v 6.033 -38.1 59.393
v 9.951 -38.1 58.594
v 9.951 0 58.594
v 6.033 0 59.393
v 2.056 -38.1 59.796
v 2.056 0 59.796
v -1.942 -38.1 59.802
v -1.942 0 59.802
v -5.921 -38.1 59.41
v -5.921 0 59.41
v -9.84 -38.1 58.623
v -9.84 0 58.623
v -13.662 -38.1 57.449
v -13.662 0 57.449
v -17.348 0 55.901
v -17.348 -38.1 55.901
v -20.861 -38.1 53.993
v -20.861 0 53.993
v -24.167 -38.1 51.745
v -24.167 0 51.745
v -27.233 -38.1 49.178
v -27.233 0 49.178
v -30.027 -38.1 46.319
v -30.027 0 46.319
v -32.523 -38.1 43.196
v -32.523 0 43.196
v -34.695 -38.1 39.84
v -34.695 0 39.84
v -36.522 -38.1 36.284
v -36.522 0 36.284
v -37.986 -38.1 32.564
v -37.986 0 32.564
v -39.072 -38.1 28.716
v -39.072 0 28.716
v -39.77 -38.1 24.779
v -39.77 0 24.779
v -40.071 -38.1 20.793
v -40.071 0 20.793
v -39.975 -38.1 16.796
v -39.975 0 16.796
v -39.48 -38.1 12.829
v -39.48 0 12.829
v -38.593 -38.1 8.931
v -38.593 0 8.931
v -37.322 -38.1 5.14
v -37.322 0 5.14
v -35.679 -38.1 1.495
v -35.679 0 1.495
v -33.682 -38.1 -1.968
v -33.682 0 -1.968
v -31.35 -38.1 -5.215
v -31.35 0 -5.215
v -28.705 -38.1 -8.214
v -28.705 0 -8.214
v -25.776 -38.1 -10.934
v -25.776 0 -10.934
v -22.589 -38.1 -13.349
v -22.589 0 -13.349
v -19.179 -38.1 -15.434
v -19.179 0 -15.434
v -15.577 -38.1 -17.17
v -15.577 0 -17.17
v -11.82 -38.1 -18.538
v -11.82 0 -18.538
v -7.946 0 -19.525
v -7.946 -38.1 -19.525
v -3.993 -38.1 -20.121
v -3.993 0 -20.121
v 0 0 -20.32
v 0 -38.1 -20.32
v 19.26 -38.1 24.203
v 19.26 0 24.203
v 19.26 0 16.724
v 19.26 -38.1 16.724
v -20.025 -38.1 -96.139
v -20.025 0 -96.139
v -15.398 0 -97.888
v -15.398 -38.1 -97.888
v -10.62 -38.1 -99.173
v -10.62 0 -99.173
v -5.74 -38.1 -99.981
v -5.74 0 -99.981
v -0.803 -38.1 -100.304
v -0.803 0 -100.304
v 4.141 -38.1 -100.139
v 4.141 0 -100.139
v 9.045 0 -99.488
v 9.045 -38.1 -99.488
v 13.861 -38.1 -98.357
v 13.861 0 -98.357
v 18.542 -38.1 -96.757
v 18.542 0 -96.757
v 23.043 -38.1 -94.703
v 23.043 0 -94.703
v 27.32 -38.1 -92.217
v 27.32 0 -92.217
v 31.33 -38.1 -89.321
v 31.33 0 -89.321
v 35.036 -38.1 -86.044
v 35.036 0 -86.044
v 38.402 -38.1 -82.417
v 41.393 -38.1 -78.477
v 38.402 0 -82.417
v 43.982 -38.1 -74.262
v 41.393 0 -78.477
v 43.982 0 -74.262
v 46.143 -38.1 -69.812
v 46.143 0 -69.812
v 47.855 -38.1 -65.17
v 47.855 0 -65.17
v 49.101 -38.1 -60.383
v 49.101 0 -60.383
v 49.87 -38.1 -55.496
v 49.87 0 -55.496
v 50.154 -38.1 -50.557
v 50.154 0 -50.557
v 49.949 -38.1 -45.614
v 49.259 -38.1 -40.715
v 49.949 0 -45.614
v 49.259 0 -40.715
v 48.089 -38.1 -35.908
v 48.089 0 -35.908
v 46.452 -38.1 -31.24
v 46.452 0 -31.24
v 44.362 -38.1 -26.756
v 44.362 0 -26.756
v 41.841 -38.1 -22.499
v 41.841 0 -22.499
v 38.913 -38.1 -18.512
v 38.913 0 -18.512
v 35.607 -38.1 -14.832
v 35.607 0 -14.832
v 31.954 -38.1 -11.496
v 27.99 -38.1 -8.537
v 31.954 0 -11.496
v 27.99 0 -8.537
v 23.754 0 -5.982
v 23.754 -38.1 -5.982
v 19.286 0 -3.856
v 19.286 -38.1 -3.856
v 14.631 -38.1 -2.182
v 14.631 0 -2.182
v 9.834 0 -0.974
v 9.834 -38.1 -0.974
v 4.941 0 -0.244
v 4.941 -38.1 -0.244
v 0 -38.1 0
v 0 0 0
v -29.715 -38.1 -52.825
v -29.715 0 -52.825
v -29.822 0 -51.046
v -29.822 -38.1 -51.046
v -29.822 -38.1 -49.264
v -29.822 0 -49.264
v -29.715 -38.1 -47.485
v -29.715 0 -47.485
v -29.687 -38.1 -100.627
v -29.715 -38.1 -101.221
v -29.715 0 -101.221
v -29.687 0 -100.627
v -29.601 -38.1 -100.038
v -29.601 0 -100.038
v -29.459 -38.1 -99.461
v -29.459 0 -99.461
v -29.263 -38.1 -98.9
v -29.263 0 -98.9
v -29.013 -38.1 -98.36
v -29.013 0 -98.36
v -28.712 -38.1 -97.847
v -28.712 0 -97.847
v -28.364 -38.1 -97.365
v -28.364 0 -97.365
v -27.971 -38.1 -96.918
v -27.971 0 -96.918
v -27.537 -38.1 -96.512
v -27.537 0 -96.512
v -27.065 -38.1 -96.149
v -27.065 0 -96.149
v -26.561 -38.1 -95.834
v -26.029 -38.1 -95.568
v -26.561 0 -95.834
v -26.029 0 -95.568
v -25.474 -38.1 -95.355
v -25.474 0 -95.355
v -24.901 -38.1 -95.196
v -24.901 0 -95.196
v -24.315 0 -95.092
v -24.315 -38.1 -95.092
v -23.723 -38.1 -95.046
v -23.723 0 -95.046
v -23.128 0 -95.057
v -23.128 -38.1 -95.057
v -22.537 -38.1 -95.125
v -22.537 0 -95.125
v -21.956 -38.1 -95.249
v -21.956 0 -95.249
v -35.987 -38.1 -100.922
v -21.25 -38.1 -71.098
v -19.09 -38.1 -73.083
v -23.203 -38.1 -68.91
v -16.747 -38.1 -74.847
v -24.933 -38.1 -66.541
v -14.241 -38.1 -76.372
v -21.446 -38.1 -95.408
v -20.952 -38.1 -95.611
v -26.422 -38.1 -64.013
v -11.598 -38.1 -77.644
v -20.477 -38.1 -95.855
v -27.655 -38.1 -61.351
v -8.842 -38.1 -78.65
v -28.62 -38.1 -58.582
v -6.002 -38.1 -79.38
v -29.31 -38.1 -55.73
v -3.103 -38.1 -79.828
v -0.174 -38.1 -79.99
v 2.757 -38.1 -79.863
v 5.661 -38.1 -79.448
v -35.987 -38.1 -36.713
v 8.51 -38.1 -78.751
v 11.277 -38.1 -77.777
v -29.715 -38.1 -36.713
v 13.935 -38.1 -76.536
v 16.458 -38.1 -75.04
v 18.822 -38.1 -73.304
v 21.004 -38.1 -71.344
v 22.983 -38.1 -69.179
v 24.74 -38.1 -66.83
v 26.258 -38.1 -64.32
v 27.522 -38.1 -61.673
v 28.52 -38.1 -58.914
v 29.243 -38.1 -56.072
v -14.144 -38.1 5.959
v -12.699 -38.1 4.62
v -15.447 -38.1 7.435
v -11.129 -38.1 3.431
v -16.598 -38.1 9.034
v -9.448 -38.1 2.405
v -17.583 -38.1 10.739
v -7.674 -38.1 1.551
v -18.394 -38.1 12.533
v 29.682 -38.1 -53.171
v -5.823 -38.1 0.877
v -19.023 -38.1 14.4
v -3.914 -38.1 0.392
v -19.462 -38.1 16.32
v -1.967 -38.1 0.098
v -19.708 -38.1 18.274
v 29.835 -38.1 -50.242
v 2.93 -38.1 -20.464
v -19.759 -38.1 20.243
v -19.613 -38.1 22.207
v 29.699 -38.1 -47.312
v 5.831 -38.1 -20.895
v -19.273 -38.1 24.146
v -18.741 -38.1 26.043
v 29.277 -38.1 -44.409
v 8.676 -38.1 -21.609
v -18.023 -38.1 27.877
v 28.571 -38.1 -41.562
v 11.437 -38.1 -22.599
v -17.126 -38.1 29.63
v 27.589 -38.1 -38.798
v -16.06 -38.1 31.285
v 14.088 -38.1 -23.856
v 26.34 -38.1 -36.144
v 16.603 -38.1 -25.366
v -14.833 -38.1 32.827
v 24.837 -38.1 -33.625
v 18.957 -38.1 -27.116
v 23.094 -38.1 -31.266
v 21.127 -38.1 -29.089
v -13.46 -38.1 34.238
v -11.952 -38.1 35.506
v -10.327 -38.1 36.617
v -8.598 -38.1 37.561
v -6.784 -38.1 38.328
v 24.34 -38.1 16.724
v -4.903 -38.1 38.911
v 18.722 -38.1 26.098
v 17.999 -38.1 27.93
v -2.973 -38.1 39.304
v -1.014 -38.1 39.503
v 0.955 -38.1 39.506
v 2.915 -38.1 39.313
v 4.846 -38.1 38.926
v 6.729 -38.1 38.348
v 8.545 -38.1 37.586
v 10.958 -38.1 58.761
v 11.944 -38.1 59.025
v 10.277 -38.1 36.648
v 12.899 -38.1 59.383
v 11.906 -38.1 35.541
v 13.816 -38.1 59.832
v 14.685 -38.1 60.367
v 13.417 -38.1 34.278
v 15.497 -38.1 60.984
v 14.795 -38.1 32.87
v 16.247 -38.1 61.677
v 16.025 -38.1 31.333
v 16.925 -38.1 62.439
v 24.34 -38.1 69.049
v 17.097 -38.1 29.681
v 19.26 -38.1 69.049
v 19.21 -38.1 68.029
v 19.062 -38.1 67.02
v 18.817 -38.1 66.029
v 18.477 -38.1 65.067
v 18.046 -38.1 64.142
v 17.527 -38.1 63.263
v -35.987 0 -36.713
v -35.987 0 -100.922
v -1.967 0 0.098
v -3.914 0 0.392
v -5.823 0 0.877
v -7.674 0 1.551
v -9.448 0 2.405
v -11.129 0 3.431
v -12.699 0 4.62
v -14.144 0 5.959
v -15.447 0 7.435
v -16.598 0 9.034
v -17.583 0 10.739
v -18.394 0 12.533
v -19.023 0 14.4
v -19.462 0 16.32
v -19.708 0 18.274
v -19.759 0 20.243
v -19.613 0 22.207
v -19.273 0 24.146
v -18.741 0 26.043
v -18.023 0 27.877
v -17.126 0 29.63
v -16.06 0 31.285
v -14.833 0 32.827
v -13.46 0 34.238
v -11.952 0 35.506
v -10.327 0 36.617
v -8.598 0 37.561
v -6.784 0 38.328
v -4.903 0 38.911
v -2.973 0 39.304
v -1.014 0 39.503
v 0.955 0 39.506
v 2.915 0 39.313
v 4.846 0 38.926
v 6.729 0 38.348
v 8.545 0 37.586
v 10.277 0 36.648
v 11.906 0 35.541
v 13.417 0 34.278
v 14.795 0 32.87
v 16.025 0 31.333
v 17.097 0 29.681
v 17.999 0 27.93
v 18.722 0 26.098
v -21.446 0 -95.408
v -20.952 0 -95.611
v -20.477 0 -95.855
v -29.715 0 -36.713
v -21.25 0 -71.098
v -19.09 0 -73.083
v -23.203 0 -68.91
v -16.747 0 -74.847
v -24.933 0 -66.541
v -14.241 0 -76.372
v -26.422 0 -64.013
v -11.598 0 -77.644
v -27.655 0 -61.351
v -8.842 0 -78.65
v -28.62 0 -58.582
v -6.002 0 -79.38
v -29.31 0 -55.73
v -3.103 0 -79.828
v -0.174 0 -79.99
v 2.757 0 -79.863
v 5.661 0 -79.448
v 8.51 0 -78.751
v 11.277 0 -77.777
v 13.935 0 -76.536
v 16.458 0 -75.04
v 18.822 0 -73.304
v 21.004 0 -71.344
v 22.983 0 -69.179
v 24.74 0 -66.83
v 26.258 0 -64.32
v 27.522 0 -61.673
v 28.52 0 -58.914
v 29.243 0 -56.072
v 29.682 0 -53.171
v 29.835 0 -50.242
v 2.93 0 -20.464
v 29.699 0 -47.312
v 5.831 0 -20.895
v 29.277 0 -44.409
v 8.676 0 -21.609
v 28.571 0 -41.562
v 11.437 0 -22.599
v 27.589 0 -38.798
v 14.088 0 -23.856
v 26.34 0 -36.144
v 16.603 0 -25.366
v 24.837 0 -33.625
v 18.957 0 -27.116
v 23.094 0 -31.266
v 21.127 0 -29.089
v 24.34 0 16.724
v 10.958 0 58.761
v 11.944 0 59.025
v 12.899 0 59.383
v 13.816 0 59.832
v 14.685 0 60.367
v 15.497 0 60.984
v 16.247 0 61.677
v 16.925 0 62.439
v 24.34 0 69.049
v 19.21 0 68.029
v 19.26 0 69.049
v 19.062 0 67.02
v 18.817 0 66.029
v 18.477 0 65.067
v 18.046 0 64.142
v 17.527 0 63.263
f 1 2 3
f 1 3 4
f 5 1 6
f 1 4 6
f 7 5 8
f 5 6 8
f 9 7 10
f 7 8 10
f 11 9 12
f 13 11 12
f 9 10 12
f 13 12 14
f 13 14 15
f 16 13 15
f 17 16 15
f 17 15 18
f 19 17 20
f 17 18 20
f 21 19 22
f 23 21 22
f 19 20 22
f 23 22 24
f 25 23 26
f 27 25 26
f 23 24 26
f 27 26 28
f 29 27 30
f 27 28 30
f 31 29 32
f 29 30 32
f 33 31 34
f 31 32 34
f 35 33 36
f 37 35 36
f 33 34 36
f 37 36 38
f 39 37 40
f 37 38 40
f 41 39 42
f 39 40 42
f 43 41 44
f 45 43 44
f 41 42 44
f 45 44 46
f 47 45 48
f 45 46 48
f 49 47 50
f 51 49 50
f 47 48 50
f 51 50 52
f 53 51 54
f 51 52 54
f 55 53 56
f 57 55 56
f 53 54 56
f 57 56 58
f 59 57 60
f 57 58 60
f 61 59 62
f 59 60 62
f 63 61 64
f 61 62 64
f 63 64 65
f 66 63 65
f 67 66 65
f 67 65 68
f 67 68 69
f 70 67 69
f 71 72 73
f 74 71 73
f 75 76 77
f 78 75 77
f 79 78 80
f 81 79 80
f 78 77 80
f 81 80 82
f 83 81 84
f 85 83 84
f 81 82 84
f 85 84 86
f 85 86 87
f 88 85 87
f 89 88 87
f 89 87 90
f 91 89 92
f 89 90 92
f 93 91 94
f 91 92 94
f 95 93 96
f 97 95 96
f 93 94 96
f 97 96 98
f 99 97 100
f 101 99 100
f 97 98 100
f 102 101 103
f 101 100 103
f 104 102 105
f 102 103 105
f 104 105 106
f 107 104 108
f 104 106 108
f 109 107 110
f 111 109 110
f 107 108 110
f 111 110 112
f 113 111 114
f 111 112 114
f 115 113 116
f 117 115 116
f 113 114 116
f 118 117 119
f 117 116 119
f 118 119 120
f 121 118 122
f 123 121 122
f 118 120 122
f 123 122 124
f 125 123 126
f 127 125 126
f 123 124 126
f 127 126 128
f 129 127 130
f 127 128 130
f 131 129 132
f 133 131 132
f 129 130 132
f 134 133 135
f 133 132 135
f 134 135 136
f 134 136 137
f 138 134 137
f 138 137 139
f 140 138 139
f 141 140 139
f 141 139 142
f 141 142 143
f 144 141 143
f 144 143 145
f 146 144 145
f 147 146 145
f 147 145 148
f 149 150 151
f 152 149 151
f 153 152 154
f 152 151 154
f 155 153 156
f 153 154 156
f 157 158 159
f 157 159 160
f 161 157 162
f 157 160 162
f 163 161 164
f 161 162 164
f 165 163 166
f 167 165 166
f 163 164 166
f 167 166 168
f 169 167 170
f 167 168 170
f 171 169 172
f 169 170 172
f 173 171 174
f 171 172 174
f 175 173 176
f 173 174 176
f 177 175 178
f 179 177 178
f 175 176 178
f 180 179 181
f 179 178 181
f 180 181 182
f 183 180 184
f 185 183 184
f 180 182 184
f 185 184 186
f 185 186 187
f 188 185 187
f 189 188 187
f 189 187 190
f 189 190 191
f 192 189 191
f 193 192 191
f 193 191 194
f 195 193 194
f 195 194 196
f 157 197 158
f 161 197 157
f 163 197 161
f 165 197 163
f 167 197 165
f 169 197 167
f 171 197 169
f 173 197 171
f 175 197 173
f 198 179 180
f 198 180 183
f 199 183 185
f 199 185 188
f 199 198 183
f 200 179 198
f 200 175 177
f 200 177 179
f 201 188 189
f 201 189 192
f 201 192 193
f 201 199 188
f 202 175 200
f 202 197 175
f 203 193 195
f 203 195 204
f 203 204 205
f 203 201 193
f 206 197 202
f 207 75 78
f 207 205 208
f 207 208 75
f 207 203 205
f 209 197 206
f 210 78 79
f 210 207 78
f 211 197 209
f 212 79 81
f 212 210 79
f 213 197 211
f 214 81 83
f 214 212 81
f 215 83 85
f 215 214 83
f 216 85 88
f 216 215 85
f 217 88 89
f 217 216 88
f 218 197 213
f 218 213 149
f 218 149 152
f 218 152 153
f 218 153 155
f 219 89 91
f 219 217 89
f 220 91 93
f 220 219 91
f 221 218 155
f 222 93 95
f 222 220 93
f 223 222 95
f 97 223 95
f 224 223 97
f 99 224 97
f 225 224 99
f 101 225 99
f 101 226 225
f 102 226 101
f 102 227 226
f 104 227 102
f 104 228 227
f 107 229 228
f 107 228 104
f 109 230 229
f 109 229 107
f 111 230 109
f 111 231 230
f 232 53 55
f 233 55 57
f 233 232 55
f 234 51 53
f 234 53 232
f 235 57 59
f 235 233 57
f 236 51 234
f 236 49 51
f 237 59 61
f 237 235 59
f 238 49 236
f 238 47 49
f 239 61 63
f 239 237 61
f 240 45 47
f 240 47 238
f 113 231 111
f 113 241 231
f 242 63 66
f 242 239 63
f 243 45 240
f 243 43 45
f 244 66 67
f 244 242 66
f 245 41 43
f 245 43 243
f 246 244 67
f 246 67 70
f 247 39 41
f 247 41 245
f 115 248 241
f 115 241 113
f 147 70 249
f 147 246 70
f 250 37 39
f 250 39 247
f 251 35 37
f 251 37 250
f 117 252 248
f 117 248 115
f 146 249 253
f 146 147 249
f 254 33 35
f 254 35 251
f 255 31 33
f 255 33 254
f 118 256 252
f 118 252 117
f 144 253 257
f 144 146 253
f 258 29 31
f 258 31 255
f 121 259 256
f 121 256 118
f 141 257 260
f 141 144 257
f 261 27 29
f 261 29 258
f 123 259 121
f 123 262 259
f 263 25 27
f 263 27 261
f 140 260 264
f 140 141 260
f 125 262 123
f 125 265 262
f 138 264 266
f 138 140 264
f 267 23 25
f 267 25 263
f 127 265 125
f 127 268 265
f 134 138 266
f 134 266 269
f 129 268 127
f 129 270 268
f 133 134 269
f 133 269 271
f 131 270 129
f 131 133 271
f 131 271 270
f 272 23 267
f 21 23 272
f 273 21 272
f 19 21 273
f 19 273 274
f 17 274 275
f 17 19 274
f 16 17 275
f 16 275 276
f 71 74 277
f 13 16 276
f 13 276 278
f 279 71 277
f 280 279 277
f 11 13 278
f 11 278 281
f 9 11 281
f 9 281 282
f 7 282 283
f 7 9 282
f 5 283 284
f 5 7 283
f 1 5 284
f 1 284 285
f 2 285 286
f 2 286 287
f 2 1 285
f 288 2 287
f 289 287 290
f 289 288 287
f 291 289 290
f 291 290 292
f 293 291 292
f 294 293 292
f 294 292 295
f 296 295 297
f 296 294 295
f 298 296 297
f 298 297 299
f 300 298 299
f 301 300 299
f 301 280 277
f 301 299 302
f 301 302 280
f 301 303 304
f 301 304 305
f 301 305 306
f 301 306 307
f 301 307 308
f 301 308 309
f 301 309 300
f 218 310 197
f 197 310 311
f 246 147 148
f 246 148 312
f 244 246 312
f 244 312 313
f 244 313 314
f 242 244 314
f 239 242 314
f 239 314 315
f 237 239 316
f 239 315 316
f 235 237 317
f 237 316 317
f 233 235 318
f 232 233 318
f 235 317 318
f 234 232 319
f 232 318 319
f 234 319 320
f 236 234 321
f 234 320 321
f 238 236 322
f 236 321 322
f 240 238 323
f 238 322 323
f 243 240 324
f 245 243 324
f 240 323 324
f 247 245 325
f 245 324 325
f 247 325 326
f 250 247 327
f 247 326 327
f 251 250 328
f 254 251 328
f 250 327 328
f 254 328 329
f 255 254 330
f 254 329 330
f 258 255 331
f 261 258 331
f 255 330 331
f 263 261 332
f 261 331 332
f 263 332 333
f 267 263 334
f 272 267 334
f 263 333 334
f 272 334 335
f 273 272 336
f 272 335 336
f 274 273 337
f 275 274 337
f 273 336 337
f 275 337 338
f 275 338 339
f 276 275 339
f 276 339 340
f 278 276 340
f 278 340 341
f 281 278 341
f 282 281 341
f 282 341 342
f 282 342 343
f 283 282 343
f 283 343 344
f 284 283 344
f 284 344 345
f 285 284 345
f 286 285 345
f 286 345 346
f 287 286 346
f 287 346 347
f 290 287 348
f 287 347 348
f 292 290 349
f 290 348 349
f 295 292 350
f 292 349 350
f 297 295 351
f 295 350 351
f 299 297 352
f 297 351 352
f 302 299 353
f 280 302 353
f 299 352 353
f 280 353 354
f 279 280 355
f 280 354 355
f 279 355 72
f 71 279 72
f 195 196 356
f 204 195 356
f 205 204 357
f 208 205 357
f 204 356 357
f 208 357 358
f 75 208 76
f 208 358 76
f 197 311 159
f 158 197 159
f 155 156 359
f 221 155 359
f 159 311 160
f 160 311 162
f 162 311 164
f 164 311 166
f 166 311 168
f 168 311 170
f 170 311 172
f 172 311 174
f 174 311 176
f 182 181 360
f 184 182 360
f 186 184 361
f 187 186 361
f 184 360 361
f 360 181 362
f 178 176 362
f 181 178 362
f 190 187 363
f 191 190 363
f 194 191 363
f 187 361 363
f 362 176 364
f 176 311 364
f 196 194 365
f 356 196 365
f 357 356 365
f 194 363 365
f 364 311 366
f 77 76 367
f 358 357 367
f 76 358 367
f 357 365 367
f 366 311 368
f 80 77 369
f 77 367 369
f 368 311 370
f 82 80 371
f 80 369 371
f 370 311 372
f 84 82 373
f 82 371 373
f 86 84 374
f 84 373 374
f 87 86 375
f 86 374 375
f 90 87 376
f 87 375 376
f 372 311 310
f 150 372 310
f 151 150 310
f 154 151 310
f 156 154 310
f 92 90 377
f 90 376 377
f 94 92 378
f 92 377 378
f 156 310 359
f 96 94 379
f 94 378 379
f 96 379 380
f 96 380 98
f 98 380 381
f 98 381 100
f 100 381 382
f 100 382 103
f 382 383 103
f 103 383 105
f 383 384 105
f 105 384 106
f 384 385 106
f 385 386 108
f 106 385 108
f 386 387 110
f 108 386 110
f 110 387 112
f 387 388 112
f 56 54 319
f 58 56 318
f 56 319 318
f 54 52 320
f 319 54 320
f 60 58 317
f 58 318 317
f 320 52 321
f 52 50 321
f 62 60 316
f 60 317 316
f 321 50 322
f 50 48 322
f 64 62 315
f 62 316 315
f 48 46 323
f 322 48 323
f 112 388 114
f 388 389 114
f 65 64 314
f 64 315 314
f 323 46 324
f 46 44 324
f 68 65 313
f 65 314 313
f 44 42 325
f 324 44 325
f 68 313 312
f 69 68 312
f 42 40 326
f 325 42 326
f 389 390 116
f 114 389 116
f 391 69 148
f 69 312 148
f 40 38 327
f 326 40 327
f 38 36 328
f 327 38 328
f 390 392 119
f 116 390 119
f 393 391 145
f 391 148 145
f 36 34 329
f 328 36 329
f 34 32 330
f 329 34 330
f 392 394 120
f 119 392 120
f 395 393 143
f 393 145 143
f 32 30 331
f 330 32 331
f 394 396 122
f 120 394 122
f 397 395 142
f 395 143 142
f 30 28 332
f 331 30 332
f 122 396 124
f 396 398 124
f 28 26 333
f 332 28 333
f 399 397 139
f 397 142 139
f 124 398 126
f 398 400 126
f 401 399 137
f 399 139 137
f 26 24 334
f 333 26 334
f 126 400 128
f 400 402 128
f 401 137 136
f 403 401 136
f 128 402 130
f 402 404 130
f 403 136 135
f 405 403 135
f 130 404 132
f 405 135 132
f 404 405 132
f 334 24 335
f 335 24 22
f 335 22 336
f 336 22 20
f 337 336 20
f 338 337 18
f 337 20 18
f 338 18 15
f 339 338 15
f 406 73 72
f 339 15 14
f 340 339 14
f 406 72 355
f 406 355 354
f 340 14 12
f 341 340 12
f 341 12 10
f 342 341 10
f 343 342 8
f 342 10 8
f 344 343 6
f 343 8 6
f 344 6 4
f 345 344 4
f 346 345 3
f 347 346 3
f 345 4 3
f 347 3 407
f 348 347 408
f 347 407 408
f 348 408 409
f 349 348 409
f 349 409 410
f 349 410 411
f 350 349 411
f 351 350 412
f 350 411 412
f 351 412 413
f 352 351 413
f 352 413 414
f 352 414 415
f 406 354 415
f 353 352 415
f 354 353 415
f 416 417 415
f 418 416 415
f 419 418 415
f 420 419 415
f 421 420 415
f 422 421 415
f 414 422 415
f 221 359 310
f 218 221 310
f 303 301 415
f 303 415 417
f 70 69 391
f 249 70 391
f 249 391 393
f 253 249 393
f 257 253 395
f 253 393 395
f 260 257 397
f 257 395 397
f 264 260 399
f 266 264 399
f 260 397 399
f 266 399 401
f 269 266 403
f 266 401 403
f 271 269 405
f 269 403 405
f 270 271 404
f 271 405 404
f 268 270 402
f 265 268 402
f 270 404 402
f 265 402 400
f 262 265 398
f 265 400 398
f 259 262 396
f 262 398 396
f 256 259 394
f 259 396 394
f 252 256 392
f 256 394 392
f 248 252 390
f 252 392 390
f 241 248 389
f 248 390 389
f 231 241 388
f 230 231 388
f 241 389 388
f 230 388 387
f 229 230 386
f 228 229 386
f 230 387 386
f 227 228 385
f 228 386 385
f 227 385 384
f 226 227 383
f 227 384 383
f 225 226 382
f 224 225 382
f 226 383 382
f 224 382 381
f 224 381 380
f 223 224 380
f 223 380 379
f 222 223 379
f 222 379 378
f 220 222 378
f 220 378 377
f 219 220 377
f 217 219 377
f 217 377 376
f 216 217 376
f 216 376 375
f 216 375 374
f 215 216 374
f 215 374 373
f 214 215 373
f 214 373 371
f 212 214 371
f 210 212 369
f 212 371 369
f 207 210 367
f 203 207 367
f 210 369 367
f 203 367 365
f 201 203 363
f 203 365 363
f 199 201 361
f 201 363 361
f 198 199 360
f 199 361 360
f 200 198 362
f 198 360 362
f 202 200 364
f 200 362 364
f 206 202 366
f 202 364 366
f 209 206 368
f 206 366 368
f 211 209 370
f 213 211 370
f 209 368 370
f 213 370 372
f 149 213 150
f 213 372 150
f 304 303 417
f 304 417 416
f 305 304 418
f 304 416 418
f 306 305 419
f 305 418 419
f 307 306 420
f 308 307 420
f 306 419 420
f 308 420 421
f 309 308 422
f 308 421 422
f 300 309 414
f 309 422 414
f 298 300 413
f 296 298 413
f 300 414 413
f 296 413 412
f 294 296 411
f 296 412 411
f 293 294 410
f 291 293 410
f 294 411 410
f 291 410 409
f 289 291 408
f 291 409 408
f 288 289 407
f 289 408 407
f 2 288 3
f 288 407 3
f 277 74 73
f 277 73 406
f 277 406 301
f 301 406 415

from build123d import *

# Parameters (mm, degrees)
F1_DEPTH = 38.1


with BuildPart() as f1:
    # F0 (on Front) → F1 (new body)
    with BuildSketch(Plane.XZ):
        with BuildLine():
            ThreePointArc((-20.02527, -96.13909), (49.101263, -60.382661), (0, 0))
            ThreePointArc((0, 0), (-15.465639, 32.071315), (19.259737, 24.20344))
            Line((19.259737, 24.20344), (19.259737, 54.919144))
            ThreePointArc((19.259737, 54.919144), (14.720483, 57.04847), (9.950919, 58.594471))
            ThreePointArc((9.950919, 58.594471), (-39.769695, 24.779488), (0, -20.32))
            ThreePointArc((0, -20.32), (22.020464, -70.285545), (-29.715391, -52.825367))
            Line((-29.715391, -52.825367), (-29.715391, -90.559729))
            ThreePointArc((-29.715391, -90.559729), (-25.941689, -93.080237), (-21.955613, -95.249332))
            ThreePointArc((-21.955613, -95.249332), (-20.951886, -95.610565), (-20.02527, -96.13909))
        make_face()
        Polygon((19.259737, 54.919144), (19.259737, 24.20344), (19.259737, 16.724238), (24.339737, 16.724238), (24.339737, 69.048567), (19.259737, 69.048567), align=None)
        with BuildLine():
            Line((-29.715391, -101.220826), (-29.715391, -90.559729))
            Line((-29.715391, -90.559729), (-29.715391, -52.825367))
            ThreePointArc((-29.715391, -52.825367), (-29.835124, -50.155124), (-29.715391, -47.484882))
            Line((-29.715391, -47.484882), (-29.715391, -36.713058))
            Line((-29.715391, -36.713058), (-35.986979, -36.713058))
            Line((-35.986979, -36.713058), (-35.986979, -100.922184))
            Line((-35.986979, -100.922184), (-29.715391, -101.220826))
        make_face()
        with BuildLine():
            ThreePointArc((-29.715391, -101.220826), (-27.305323, -96.325091), (-21.955613, -95.249332))
            ThreePointArc((-21.955613, -95.249332), (-25.941689, -93.080237), (-29.715391, -90.559729))
            Line((-29.715391, -90.559729), (-29.715391, -101.220826))
        make_face()
        with BuildLine():
            ThreePointArc((9.950919, 58.594471), (14.720483, 57.04847), (19.259737, 54.919144))
            Line((19.259737, 54.919144), (19.259737, 69.048567))
            ThreePointArc((19.259737, 69.048567), (16.59525, 62.049598), (9.950919, 58.594471))
        make_face()
    extrude(amount=F1_DEPTH)


solid = f1.part
